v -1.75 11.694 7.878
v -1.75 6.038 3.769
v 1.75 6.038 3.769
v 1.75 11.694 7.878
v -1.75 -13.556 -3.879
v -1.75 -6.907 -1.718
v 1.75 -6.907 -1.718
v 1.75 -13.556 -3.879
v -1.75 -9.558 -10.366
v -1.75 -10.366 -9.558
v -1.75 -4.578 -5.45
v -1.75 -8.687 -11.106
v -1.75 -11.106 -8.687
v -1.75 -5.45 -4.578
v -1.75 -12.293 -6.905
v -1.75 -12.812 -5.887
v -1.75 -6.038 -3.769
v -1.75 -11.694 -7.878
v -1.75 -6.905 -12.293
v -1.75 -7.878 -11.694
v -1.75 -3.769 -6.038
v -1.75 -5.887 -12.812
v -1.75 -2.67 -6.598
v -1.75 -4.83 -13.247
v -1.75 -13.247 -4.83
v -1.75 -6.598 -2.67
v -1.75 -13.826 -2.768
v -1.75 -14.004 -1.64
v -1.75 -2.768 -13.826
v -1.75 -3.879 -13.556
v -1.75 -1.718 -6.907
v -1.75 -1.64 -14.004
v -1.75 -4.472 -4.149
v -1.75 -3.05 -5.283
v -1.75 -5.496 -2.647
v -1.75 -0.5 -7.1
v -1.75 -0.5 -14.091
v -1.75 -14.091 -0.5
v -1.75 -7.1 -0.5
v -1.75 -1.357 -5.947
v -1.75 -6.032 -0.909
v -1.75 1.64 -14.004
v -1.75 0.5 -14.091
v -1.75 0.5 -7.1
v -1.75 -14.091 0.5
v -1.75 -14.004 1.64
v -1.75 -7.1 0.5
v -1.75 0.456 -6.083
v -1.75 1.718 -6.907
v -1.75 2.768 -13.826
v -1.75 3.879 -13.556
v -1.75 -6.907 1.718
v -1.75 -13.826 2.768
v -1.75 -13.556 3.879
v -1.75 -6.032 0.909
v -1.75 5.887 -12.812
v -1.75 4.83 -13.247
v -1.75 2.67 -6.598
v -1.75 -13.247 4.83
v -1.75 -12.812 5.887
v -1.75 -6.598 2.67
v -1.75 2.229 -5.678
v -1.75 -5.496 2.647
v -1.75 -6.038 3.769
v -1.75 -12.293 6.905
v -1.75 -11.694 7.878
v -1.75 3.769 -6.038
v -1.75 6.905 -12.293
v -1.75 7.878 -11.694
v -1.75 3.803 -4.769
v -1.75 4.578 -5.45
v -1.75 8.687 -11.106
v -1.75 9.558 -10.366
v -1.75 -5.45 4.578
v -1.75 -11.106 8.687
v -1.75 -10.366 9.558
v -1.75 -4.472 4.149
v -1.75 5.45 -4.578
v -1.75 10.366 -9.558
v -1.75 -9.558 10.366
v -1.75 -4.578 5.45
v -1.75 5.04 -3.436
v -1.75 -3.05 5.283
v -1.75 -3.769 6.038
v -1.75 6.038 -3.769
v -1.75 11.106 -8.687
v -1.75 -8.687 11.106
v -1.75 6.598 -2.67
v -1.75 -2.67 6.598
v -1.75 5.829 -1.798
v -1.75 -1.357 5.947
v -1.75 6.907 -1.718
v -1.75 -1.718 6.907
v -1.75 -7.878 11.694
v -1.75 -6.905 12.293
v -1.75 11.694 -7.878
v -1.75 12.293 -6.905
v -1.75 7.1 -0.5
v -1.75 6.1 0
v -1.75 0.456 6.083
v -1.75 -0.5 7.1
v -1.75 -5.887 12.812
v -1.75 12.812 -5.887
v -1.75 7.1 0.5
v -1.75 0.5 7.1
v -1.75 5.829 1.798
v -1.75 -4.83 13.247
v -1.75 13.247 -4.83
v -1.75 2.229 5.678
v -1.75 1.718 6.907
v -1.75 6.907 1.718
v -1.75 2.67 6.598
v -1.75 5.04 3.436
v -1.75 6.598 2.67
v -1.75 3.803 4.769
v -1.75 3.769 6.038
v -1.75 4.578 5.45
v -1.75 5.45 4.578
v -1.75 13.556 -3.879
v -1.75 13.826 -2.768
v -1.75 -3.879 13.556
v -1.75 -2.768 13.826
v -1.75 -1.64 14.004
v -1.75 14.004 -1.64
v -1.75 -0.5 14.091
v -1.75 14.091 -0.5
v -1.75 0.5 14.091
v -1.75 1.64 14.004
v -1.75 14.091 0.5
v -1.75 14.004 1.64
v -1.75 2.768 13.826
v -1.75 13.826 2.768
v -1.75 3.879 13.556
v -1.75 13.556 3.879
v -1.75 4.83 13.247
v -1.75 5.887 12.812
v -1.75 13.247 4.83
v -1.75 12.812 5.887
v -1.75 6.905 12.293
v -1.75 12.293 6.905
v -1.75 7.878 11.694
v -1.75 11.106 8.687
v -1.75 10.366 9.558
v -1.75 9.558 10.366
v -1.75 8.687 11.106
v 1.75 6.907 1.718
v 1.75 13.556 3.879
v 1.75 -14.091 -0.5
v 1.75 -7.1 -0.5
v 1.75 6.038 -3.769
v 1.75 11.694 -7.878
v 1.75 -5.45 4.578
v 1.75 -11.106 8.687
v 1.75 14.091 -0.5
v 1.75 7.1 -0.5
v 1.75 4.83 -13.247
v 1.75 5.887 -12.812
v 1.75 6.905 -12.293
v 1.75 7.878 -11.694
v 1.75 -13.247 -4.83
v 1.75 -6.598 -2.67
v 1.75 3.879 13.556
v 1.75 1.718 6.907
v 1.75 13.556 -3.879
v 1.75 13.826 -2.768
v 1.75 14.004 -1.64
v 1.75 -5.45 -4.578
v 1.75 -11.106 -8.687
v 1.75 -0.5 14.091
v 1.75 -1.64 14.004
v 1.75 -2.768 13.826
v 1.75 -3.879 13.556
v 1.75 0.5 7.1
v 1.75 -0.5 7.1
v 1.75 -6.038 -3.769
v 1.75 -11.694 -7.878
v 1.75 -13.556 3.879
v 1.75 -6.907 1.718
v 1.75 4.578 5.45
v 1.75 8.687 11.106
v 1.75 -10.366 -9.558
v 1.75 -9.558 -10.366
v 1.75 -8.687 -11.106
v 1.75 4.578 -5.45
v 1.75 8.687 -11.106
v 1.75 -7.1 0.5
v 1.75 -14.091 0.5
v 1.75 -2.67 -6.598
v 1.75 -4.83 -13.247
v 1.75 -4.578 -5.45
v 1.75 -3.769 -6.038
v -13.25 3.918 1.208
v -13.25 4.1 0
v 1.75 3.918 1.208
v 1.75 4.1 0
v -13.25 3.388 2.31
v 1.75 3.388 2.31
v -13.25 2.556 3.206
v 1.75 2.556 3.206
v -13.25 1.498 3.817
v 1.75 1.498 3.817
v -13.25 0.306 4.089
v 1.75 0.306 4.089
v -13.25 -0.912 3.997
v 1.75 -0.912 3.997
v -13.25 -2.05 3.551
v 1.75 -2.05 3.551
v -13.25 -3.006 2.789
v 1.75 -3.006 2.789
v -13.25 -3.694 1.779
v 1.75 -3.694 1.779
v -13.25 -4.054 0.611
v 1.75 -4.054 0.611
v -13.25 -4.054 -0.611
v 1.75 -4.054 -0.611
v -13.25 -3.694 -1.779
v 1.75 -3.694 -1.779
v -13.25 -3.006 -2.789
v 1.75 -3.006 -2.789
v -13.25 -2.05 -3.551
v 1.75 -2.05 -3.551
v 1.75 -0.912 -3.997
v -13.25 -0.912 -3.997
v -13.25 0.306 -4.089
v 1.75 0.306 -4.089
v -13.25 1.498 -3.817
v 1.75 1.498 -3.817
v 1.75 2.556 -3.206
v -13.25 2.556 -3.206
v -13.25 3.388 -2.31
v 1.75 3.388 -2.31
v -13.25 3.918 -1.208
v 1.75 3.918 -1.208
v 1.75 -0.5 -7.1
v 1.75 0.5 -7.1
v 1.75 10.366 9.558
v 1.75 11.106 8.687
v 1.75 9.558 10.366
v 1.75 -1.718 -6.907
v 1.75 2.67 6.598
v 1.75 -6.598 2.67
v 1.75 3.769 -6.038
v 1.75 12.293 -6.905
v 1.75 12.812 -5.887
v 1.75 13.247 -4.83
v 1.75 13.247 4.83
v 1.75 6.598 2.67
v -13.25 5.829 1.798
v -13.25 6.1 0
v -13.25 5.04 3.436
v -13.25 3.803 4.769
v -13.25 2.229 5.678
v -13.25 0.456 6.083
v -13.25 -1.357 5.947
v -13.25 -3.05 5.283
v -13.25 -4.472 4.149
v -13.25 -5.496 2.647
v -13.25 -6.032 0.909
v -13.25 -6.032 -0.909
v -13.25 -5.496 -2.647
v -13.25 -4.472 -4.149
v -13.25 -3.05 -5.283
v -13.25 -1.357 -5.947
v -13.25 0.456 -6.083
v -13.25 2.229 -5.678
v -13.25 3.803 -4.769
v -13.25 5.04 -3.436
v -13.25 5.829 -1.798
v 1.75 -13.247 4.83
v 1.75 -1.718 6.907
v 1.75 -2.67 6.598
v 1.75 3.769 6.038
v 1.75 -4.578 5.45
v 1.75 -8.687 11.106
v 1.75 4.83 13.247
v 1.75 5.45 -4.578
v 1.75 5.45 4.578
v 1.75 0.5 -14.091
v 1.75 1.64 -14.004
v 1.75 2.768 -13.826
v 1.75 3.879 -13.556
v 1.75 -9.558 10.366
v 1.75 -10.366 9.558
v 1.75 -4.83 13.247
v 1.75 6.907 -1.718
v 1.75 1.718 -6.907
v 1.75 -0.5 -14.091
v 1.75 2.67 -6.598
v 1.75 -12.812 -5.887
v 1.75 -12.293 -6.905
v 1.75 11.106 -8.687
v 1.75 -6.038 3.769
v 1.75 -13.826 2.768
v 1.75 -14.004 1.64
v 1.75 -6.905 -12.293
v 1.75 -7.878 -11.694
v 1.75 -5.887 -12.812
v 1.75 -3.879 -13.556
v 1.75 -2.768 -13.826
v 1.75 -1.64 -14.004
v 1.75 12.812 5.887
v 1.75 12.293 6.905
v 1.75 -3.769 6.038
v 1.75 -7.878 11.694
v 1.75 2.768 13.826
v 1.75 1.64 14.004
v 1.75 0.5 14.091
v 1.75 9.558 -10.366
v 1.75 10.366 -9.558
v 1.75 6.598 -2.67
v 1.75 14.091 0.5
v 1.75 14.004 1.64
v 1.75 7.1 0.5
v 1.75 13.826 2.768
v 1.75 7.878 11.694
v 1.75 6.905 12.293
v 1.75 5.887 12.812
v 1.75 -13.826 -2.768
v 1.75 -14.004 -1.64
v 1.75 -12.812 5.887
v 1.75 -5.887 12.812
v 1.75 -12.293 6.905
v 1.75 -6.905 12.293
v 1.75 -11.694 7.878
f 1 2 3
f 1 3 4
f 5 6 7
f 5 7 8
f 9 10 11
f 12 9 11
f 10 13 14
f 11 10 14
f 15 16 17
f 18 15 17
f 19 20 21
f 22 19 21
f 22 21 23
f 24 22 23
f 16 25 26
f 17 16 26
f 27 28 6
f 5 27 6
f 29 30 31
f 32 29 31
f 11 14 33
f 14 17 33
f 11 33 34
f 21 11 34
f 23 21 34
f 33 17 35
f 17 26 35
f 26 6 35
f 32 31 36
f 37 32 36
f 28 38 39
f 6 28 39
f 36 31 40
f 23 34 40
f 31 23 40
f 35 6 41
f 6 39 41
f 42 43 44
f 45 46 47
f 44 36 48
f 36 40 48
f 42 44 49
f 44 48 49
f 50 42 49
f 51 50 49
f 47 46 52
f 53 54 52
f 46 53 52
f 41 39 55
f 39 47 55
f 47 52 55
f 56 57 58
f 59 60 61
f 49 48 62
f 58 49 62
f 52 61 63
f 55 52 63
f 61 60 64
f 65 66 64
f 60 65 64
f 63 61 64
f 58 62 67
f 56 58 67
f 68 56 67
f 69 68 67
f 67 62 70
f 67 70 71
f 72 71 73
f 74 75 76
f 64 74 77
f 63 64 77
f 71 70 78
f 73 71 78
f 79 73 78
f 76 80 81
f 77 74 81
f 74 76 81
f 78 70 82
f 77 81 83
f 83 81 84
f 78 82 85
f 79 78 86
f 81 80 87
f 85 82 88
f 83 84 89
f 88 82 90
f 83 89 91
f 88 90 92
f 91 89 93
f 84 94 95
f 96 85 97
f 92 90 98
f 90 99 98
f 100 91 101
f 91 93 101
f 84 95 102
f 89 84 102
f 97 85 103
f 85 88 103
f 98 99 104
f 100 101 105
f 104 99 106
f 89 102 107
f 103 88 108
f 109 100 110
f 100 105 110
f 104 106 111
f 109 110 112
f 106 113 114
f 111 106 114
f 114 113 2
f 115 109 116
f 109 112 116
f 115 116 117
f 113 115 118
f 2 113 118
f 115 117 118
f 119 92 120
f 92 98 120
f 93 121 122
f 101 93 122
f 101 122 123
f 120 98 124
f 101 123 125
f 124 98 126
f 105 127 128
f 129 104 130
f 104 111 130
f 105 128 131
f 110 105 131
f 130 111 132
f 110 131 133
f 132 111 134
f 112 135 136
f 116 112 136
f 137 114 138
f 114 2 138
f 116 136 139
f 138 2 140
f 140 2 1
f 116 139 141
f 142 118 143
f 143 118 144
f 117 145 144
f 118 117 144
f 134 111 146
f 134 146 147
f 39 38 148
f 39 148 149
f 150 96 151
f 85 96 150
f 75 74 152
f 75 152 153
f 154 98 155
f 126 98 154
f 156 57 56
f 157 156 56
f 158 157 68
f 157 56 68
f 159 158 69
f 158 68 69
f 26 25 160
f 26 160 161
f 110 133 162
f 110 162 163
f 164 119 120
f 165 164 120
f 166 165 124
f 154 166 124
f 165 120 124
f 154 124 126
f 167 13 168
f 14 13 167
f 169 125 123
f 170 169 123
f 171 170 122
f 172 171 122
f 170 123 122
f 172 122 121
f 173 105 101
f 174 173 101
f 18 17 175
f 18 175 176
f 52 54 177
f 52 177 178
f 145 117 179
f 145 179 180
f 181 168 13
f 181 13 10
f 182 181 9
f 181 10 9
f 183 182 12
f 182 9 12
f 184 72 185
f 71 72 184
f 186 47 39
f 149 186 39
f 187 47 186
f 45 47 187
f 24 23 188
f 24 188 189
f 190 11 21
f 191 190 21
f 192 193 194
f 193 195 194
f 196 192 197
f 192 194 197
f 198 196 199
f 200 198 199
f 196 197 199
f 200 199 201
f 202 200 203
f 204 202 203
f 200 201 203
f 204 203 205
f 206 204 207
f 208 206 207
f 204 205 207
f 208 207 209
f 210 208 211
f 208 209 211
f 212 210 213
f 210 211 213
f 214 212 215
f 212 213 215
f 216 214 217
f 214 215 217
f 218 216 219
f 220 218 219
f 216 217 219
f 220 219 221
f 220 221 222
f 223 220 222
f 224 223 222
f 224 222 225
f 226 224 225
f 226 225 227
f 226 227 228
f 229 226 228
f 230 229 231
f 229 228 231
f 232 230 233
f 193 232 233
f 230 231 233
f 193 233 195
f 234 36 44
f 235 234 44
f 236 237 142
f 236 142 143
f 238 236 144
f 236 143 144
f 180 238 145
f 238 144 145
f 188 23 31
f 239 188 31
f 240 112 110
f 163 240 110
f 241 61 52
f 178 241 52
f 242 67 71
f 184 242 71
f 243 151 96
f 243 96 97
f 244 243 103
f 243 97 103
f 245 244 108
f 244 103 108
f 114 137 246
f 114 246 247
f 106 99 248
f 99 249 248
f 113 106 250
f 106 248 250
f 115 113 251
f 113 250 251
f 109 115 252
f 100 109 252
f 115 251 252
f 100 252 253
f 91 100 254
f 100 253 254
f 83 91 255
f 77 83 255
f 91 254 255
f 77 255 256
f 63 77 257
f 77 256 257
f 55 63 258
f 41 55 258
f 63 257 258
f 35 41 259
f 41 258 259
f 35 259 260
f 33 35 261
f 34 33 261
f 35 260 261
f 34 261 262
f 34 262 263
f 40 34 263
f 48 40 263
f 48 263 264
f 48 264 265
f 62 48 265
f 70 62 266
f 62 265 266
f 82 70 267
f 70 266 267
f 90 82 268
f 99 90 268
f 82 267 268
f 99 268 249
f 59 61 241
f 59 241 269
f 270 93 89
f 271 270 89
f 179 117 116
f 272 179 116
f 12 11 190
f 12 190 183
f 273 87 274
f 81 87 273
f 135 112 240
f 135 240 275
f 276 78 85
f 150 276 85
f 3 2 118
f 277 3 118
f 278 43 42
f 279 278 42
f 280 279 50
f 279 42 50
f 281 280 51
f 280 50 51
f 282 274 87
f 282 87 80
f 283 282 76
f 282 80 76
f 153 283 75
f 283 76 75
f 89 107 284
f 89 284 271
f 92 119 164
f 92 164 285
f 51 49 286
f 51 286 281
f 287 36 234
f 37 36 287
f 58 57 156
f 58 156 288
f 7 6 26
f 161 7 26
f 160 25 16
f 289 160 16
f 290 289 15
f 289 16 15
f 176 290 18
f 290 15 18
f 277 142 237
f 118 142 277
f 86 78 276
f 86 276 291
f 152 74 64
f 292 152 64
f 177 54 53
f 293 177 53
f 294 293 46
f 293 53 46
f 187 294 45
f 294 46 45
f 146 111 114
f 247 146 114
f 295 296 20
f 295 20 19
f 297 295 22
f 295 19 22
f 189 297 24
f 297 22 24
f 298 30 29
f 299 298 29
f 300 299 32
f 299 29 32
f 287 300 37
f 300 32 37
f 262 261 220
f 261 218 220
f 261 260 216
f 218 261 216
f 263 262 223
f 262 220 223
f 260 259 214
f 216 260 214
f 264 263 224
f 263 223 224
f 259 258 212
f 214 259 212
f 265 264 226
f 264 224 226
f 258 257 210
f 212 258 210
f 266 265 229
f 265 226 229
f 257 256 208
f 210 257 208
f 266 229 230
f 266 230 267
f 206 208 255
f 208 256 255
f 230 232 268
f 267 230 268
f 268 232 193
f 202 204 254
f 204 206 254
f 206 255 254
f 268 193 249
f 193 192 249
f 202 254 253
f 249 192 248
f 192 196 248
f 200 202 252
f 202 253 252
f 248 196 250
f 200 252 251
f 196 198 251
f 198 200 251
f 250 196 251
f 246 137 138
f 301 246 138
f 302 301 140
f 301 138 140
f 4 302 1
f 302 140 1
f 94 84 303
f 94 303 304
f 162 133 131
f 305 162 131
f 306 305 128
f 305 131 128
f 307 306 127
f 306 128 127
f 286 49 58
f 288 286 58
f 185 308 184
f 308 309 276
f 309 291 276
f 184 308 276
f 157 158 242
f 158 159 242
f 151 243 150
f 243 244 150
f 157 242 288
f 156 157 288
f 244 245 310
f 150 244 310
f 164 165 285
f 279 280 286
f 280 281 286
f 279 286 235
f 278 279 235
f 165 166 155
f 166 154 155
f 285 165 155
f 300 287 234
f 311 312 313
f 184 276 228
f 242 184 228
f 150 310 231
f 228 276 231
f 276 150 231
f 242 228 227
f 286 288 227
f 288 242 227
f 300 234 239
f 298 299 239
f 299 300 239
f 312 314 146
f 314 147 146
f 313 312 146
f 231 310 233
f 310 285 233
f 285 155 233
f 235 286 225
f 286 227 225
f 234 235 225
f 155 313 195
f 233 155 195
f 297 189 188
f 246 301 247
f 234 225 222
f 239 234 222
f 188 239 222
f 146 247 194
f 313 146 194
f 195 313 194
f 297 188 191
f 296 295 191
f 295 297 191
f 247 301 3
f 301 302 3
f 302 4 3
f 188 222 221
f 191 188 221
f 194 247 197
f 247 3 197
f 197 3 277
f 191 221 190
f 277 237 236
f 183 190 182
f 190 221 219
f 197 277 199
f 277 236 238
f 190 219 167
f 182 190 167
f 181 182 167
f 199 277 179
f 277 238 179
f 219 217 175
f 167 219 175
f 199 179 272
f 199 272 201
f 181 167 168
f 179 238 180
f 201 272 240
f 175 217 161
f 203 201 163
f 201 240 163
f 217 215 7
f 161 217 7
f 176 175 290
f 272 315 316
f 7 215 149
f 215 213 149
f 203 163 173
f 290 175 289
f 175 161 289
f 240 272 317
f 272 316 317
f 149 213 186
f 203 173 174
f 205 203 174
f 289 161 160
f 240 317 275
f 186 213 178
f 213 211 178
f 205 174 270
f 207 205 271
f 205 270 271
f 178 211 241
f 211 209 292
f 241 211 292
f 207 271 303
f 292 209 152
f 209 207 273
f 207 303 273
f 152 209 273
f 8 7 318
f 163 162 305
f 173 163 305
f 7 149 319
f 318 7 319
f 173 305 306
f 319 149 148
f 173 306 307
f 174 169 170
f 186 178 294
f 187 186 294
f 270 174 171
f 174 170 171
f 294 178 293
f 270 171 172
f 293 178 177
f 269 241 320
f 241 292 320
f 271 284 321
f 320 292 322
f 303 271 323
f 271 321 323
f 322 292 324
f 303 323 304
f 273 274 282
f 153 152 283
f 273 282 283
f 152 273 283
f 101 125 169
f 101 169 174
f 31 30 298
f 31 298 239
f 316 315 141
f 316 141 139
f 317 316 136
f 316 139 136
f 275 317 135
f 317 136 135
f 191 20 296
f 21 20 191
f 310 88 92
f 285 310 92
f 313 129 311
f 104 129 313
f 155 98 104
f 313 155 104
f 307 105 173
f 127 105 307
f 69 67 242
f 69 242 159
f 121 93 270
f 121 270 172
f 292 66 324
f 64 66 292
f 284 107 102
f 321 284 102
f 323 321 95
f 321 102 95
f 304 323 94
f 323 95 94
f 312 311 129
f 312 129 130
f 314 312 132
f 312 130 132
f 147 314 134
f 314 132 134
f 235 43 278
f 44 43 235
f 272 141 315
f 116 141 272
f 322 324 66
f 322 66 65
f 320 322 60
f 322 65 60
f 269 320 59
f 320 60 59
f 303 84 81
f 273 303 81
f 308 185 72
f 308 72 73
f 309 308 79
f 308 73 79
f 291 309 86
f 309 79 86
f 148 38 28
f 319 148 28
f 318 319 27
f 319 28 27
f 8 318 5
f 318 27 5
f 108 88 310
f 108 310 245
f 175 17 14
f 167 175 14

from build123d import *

# Parameters (mm, degrees)
POCKET_DEPTH       = 3.5
POLARPATTERN_COUNT = 20


with BuildPart() as part:
    # Sketch → Revolution (revolve)
    with BuildSketch(Plane.XY):
        Polygon((1.75, 4.1), (1.75, 14.1), (0, 14.1), (-1.75, 14.1), (-1.75, 6.1), (-13.25, 6.1), (-13.25, 4.1), align=None)
    revolve(axis=Axis((0, 0, 0), (1, 0, 0)))

    # Sketch001 (on Face4 of Revolution) → Pocket (cut)
    with BuildSketch(Plane(origin=(-1.75, 0, 0), x_dir=(0, -1, 0), z_dir=(-1, 0, 0))):
        Polygon((-0.5, 15.1), (0.5, 15.1), (0.5, 7.1), (0, 7.1), (-0.5, 7.1), align=None)
    pocket = extrude(amount=-POCKET_DEPTH, mode=Mode.SUBTRACT)

    # PolarPattern: Pocket ×20 about axis
    polarpattern_axis = Axis((-1.75, 0, 0), (-1, 0, 0))
    for i in range(1, POLARPATTERN_COUNT):
        add(pocket.rotate(polarpattern_axis, i * 360 / POLARPATTERN_COUNT), mode=Mode.SUBTRACT)


solid = part.part
